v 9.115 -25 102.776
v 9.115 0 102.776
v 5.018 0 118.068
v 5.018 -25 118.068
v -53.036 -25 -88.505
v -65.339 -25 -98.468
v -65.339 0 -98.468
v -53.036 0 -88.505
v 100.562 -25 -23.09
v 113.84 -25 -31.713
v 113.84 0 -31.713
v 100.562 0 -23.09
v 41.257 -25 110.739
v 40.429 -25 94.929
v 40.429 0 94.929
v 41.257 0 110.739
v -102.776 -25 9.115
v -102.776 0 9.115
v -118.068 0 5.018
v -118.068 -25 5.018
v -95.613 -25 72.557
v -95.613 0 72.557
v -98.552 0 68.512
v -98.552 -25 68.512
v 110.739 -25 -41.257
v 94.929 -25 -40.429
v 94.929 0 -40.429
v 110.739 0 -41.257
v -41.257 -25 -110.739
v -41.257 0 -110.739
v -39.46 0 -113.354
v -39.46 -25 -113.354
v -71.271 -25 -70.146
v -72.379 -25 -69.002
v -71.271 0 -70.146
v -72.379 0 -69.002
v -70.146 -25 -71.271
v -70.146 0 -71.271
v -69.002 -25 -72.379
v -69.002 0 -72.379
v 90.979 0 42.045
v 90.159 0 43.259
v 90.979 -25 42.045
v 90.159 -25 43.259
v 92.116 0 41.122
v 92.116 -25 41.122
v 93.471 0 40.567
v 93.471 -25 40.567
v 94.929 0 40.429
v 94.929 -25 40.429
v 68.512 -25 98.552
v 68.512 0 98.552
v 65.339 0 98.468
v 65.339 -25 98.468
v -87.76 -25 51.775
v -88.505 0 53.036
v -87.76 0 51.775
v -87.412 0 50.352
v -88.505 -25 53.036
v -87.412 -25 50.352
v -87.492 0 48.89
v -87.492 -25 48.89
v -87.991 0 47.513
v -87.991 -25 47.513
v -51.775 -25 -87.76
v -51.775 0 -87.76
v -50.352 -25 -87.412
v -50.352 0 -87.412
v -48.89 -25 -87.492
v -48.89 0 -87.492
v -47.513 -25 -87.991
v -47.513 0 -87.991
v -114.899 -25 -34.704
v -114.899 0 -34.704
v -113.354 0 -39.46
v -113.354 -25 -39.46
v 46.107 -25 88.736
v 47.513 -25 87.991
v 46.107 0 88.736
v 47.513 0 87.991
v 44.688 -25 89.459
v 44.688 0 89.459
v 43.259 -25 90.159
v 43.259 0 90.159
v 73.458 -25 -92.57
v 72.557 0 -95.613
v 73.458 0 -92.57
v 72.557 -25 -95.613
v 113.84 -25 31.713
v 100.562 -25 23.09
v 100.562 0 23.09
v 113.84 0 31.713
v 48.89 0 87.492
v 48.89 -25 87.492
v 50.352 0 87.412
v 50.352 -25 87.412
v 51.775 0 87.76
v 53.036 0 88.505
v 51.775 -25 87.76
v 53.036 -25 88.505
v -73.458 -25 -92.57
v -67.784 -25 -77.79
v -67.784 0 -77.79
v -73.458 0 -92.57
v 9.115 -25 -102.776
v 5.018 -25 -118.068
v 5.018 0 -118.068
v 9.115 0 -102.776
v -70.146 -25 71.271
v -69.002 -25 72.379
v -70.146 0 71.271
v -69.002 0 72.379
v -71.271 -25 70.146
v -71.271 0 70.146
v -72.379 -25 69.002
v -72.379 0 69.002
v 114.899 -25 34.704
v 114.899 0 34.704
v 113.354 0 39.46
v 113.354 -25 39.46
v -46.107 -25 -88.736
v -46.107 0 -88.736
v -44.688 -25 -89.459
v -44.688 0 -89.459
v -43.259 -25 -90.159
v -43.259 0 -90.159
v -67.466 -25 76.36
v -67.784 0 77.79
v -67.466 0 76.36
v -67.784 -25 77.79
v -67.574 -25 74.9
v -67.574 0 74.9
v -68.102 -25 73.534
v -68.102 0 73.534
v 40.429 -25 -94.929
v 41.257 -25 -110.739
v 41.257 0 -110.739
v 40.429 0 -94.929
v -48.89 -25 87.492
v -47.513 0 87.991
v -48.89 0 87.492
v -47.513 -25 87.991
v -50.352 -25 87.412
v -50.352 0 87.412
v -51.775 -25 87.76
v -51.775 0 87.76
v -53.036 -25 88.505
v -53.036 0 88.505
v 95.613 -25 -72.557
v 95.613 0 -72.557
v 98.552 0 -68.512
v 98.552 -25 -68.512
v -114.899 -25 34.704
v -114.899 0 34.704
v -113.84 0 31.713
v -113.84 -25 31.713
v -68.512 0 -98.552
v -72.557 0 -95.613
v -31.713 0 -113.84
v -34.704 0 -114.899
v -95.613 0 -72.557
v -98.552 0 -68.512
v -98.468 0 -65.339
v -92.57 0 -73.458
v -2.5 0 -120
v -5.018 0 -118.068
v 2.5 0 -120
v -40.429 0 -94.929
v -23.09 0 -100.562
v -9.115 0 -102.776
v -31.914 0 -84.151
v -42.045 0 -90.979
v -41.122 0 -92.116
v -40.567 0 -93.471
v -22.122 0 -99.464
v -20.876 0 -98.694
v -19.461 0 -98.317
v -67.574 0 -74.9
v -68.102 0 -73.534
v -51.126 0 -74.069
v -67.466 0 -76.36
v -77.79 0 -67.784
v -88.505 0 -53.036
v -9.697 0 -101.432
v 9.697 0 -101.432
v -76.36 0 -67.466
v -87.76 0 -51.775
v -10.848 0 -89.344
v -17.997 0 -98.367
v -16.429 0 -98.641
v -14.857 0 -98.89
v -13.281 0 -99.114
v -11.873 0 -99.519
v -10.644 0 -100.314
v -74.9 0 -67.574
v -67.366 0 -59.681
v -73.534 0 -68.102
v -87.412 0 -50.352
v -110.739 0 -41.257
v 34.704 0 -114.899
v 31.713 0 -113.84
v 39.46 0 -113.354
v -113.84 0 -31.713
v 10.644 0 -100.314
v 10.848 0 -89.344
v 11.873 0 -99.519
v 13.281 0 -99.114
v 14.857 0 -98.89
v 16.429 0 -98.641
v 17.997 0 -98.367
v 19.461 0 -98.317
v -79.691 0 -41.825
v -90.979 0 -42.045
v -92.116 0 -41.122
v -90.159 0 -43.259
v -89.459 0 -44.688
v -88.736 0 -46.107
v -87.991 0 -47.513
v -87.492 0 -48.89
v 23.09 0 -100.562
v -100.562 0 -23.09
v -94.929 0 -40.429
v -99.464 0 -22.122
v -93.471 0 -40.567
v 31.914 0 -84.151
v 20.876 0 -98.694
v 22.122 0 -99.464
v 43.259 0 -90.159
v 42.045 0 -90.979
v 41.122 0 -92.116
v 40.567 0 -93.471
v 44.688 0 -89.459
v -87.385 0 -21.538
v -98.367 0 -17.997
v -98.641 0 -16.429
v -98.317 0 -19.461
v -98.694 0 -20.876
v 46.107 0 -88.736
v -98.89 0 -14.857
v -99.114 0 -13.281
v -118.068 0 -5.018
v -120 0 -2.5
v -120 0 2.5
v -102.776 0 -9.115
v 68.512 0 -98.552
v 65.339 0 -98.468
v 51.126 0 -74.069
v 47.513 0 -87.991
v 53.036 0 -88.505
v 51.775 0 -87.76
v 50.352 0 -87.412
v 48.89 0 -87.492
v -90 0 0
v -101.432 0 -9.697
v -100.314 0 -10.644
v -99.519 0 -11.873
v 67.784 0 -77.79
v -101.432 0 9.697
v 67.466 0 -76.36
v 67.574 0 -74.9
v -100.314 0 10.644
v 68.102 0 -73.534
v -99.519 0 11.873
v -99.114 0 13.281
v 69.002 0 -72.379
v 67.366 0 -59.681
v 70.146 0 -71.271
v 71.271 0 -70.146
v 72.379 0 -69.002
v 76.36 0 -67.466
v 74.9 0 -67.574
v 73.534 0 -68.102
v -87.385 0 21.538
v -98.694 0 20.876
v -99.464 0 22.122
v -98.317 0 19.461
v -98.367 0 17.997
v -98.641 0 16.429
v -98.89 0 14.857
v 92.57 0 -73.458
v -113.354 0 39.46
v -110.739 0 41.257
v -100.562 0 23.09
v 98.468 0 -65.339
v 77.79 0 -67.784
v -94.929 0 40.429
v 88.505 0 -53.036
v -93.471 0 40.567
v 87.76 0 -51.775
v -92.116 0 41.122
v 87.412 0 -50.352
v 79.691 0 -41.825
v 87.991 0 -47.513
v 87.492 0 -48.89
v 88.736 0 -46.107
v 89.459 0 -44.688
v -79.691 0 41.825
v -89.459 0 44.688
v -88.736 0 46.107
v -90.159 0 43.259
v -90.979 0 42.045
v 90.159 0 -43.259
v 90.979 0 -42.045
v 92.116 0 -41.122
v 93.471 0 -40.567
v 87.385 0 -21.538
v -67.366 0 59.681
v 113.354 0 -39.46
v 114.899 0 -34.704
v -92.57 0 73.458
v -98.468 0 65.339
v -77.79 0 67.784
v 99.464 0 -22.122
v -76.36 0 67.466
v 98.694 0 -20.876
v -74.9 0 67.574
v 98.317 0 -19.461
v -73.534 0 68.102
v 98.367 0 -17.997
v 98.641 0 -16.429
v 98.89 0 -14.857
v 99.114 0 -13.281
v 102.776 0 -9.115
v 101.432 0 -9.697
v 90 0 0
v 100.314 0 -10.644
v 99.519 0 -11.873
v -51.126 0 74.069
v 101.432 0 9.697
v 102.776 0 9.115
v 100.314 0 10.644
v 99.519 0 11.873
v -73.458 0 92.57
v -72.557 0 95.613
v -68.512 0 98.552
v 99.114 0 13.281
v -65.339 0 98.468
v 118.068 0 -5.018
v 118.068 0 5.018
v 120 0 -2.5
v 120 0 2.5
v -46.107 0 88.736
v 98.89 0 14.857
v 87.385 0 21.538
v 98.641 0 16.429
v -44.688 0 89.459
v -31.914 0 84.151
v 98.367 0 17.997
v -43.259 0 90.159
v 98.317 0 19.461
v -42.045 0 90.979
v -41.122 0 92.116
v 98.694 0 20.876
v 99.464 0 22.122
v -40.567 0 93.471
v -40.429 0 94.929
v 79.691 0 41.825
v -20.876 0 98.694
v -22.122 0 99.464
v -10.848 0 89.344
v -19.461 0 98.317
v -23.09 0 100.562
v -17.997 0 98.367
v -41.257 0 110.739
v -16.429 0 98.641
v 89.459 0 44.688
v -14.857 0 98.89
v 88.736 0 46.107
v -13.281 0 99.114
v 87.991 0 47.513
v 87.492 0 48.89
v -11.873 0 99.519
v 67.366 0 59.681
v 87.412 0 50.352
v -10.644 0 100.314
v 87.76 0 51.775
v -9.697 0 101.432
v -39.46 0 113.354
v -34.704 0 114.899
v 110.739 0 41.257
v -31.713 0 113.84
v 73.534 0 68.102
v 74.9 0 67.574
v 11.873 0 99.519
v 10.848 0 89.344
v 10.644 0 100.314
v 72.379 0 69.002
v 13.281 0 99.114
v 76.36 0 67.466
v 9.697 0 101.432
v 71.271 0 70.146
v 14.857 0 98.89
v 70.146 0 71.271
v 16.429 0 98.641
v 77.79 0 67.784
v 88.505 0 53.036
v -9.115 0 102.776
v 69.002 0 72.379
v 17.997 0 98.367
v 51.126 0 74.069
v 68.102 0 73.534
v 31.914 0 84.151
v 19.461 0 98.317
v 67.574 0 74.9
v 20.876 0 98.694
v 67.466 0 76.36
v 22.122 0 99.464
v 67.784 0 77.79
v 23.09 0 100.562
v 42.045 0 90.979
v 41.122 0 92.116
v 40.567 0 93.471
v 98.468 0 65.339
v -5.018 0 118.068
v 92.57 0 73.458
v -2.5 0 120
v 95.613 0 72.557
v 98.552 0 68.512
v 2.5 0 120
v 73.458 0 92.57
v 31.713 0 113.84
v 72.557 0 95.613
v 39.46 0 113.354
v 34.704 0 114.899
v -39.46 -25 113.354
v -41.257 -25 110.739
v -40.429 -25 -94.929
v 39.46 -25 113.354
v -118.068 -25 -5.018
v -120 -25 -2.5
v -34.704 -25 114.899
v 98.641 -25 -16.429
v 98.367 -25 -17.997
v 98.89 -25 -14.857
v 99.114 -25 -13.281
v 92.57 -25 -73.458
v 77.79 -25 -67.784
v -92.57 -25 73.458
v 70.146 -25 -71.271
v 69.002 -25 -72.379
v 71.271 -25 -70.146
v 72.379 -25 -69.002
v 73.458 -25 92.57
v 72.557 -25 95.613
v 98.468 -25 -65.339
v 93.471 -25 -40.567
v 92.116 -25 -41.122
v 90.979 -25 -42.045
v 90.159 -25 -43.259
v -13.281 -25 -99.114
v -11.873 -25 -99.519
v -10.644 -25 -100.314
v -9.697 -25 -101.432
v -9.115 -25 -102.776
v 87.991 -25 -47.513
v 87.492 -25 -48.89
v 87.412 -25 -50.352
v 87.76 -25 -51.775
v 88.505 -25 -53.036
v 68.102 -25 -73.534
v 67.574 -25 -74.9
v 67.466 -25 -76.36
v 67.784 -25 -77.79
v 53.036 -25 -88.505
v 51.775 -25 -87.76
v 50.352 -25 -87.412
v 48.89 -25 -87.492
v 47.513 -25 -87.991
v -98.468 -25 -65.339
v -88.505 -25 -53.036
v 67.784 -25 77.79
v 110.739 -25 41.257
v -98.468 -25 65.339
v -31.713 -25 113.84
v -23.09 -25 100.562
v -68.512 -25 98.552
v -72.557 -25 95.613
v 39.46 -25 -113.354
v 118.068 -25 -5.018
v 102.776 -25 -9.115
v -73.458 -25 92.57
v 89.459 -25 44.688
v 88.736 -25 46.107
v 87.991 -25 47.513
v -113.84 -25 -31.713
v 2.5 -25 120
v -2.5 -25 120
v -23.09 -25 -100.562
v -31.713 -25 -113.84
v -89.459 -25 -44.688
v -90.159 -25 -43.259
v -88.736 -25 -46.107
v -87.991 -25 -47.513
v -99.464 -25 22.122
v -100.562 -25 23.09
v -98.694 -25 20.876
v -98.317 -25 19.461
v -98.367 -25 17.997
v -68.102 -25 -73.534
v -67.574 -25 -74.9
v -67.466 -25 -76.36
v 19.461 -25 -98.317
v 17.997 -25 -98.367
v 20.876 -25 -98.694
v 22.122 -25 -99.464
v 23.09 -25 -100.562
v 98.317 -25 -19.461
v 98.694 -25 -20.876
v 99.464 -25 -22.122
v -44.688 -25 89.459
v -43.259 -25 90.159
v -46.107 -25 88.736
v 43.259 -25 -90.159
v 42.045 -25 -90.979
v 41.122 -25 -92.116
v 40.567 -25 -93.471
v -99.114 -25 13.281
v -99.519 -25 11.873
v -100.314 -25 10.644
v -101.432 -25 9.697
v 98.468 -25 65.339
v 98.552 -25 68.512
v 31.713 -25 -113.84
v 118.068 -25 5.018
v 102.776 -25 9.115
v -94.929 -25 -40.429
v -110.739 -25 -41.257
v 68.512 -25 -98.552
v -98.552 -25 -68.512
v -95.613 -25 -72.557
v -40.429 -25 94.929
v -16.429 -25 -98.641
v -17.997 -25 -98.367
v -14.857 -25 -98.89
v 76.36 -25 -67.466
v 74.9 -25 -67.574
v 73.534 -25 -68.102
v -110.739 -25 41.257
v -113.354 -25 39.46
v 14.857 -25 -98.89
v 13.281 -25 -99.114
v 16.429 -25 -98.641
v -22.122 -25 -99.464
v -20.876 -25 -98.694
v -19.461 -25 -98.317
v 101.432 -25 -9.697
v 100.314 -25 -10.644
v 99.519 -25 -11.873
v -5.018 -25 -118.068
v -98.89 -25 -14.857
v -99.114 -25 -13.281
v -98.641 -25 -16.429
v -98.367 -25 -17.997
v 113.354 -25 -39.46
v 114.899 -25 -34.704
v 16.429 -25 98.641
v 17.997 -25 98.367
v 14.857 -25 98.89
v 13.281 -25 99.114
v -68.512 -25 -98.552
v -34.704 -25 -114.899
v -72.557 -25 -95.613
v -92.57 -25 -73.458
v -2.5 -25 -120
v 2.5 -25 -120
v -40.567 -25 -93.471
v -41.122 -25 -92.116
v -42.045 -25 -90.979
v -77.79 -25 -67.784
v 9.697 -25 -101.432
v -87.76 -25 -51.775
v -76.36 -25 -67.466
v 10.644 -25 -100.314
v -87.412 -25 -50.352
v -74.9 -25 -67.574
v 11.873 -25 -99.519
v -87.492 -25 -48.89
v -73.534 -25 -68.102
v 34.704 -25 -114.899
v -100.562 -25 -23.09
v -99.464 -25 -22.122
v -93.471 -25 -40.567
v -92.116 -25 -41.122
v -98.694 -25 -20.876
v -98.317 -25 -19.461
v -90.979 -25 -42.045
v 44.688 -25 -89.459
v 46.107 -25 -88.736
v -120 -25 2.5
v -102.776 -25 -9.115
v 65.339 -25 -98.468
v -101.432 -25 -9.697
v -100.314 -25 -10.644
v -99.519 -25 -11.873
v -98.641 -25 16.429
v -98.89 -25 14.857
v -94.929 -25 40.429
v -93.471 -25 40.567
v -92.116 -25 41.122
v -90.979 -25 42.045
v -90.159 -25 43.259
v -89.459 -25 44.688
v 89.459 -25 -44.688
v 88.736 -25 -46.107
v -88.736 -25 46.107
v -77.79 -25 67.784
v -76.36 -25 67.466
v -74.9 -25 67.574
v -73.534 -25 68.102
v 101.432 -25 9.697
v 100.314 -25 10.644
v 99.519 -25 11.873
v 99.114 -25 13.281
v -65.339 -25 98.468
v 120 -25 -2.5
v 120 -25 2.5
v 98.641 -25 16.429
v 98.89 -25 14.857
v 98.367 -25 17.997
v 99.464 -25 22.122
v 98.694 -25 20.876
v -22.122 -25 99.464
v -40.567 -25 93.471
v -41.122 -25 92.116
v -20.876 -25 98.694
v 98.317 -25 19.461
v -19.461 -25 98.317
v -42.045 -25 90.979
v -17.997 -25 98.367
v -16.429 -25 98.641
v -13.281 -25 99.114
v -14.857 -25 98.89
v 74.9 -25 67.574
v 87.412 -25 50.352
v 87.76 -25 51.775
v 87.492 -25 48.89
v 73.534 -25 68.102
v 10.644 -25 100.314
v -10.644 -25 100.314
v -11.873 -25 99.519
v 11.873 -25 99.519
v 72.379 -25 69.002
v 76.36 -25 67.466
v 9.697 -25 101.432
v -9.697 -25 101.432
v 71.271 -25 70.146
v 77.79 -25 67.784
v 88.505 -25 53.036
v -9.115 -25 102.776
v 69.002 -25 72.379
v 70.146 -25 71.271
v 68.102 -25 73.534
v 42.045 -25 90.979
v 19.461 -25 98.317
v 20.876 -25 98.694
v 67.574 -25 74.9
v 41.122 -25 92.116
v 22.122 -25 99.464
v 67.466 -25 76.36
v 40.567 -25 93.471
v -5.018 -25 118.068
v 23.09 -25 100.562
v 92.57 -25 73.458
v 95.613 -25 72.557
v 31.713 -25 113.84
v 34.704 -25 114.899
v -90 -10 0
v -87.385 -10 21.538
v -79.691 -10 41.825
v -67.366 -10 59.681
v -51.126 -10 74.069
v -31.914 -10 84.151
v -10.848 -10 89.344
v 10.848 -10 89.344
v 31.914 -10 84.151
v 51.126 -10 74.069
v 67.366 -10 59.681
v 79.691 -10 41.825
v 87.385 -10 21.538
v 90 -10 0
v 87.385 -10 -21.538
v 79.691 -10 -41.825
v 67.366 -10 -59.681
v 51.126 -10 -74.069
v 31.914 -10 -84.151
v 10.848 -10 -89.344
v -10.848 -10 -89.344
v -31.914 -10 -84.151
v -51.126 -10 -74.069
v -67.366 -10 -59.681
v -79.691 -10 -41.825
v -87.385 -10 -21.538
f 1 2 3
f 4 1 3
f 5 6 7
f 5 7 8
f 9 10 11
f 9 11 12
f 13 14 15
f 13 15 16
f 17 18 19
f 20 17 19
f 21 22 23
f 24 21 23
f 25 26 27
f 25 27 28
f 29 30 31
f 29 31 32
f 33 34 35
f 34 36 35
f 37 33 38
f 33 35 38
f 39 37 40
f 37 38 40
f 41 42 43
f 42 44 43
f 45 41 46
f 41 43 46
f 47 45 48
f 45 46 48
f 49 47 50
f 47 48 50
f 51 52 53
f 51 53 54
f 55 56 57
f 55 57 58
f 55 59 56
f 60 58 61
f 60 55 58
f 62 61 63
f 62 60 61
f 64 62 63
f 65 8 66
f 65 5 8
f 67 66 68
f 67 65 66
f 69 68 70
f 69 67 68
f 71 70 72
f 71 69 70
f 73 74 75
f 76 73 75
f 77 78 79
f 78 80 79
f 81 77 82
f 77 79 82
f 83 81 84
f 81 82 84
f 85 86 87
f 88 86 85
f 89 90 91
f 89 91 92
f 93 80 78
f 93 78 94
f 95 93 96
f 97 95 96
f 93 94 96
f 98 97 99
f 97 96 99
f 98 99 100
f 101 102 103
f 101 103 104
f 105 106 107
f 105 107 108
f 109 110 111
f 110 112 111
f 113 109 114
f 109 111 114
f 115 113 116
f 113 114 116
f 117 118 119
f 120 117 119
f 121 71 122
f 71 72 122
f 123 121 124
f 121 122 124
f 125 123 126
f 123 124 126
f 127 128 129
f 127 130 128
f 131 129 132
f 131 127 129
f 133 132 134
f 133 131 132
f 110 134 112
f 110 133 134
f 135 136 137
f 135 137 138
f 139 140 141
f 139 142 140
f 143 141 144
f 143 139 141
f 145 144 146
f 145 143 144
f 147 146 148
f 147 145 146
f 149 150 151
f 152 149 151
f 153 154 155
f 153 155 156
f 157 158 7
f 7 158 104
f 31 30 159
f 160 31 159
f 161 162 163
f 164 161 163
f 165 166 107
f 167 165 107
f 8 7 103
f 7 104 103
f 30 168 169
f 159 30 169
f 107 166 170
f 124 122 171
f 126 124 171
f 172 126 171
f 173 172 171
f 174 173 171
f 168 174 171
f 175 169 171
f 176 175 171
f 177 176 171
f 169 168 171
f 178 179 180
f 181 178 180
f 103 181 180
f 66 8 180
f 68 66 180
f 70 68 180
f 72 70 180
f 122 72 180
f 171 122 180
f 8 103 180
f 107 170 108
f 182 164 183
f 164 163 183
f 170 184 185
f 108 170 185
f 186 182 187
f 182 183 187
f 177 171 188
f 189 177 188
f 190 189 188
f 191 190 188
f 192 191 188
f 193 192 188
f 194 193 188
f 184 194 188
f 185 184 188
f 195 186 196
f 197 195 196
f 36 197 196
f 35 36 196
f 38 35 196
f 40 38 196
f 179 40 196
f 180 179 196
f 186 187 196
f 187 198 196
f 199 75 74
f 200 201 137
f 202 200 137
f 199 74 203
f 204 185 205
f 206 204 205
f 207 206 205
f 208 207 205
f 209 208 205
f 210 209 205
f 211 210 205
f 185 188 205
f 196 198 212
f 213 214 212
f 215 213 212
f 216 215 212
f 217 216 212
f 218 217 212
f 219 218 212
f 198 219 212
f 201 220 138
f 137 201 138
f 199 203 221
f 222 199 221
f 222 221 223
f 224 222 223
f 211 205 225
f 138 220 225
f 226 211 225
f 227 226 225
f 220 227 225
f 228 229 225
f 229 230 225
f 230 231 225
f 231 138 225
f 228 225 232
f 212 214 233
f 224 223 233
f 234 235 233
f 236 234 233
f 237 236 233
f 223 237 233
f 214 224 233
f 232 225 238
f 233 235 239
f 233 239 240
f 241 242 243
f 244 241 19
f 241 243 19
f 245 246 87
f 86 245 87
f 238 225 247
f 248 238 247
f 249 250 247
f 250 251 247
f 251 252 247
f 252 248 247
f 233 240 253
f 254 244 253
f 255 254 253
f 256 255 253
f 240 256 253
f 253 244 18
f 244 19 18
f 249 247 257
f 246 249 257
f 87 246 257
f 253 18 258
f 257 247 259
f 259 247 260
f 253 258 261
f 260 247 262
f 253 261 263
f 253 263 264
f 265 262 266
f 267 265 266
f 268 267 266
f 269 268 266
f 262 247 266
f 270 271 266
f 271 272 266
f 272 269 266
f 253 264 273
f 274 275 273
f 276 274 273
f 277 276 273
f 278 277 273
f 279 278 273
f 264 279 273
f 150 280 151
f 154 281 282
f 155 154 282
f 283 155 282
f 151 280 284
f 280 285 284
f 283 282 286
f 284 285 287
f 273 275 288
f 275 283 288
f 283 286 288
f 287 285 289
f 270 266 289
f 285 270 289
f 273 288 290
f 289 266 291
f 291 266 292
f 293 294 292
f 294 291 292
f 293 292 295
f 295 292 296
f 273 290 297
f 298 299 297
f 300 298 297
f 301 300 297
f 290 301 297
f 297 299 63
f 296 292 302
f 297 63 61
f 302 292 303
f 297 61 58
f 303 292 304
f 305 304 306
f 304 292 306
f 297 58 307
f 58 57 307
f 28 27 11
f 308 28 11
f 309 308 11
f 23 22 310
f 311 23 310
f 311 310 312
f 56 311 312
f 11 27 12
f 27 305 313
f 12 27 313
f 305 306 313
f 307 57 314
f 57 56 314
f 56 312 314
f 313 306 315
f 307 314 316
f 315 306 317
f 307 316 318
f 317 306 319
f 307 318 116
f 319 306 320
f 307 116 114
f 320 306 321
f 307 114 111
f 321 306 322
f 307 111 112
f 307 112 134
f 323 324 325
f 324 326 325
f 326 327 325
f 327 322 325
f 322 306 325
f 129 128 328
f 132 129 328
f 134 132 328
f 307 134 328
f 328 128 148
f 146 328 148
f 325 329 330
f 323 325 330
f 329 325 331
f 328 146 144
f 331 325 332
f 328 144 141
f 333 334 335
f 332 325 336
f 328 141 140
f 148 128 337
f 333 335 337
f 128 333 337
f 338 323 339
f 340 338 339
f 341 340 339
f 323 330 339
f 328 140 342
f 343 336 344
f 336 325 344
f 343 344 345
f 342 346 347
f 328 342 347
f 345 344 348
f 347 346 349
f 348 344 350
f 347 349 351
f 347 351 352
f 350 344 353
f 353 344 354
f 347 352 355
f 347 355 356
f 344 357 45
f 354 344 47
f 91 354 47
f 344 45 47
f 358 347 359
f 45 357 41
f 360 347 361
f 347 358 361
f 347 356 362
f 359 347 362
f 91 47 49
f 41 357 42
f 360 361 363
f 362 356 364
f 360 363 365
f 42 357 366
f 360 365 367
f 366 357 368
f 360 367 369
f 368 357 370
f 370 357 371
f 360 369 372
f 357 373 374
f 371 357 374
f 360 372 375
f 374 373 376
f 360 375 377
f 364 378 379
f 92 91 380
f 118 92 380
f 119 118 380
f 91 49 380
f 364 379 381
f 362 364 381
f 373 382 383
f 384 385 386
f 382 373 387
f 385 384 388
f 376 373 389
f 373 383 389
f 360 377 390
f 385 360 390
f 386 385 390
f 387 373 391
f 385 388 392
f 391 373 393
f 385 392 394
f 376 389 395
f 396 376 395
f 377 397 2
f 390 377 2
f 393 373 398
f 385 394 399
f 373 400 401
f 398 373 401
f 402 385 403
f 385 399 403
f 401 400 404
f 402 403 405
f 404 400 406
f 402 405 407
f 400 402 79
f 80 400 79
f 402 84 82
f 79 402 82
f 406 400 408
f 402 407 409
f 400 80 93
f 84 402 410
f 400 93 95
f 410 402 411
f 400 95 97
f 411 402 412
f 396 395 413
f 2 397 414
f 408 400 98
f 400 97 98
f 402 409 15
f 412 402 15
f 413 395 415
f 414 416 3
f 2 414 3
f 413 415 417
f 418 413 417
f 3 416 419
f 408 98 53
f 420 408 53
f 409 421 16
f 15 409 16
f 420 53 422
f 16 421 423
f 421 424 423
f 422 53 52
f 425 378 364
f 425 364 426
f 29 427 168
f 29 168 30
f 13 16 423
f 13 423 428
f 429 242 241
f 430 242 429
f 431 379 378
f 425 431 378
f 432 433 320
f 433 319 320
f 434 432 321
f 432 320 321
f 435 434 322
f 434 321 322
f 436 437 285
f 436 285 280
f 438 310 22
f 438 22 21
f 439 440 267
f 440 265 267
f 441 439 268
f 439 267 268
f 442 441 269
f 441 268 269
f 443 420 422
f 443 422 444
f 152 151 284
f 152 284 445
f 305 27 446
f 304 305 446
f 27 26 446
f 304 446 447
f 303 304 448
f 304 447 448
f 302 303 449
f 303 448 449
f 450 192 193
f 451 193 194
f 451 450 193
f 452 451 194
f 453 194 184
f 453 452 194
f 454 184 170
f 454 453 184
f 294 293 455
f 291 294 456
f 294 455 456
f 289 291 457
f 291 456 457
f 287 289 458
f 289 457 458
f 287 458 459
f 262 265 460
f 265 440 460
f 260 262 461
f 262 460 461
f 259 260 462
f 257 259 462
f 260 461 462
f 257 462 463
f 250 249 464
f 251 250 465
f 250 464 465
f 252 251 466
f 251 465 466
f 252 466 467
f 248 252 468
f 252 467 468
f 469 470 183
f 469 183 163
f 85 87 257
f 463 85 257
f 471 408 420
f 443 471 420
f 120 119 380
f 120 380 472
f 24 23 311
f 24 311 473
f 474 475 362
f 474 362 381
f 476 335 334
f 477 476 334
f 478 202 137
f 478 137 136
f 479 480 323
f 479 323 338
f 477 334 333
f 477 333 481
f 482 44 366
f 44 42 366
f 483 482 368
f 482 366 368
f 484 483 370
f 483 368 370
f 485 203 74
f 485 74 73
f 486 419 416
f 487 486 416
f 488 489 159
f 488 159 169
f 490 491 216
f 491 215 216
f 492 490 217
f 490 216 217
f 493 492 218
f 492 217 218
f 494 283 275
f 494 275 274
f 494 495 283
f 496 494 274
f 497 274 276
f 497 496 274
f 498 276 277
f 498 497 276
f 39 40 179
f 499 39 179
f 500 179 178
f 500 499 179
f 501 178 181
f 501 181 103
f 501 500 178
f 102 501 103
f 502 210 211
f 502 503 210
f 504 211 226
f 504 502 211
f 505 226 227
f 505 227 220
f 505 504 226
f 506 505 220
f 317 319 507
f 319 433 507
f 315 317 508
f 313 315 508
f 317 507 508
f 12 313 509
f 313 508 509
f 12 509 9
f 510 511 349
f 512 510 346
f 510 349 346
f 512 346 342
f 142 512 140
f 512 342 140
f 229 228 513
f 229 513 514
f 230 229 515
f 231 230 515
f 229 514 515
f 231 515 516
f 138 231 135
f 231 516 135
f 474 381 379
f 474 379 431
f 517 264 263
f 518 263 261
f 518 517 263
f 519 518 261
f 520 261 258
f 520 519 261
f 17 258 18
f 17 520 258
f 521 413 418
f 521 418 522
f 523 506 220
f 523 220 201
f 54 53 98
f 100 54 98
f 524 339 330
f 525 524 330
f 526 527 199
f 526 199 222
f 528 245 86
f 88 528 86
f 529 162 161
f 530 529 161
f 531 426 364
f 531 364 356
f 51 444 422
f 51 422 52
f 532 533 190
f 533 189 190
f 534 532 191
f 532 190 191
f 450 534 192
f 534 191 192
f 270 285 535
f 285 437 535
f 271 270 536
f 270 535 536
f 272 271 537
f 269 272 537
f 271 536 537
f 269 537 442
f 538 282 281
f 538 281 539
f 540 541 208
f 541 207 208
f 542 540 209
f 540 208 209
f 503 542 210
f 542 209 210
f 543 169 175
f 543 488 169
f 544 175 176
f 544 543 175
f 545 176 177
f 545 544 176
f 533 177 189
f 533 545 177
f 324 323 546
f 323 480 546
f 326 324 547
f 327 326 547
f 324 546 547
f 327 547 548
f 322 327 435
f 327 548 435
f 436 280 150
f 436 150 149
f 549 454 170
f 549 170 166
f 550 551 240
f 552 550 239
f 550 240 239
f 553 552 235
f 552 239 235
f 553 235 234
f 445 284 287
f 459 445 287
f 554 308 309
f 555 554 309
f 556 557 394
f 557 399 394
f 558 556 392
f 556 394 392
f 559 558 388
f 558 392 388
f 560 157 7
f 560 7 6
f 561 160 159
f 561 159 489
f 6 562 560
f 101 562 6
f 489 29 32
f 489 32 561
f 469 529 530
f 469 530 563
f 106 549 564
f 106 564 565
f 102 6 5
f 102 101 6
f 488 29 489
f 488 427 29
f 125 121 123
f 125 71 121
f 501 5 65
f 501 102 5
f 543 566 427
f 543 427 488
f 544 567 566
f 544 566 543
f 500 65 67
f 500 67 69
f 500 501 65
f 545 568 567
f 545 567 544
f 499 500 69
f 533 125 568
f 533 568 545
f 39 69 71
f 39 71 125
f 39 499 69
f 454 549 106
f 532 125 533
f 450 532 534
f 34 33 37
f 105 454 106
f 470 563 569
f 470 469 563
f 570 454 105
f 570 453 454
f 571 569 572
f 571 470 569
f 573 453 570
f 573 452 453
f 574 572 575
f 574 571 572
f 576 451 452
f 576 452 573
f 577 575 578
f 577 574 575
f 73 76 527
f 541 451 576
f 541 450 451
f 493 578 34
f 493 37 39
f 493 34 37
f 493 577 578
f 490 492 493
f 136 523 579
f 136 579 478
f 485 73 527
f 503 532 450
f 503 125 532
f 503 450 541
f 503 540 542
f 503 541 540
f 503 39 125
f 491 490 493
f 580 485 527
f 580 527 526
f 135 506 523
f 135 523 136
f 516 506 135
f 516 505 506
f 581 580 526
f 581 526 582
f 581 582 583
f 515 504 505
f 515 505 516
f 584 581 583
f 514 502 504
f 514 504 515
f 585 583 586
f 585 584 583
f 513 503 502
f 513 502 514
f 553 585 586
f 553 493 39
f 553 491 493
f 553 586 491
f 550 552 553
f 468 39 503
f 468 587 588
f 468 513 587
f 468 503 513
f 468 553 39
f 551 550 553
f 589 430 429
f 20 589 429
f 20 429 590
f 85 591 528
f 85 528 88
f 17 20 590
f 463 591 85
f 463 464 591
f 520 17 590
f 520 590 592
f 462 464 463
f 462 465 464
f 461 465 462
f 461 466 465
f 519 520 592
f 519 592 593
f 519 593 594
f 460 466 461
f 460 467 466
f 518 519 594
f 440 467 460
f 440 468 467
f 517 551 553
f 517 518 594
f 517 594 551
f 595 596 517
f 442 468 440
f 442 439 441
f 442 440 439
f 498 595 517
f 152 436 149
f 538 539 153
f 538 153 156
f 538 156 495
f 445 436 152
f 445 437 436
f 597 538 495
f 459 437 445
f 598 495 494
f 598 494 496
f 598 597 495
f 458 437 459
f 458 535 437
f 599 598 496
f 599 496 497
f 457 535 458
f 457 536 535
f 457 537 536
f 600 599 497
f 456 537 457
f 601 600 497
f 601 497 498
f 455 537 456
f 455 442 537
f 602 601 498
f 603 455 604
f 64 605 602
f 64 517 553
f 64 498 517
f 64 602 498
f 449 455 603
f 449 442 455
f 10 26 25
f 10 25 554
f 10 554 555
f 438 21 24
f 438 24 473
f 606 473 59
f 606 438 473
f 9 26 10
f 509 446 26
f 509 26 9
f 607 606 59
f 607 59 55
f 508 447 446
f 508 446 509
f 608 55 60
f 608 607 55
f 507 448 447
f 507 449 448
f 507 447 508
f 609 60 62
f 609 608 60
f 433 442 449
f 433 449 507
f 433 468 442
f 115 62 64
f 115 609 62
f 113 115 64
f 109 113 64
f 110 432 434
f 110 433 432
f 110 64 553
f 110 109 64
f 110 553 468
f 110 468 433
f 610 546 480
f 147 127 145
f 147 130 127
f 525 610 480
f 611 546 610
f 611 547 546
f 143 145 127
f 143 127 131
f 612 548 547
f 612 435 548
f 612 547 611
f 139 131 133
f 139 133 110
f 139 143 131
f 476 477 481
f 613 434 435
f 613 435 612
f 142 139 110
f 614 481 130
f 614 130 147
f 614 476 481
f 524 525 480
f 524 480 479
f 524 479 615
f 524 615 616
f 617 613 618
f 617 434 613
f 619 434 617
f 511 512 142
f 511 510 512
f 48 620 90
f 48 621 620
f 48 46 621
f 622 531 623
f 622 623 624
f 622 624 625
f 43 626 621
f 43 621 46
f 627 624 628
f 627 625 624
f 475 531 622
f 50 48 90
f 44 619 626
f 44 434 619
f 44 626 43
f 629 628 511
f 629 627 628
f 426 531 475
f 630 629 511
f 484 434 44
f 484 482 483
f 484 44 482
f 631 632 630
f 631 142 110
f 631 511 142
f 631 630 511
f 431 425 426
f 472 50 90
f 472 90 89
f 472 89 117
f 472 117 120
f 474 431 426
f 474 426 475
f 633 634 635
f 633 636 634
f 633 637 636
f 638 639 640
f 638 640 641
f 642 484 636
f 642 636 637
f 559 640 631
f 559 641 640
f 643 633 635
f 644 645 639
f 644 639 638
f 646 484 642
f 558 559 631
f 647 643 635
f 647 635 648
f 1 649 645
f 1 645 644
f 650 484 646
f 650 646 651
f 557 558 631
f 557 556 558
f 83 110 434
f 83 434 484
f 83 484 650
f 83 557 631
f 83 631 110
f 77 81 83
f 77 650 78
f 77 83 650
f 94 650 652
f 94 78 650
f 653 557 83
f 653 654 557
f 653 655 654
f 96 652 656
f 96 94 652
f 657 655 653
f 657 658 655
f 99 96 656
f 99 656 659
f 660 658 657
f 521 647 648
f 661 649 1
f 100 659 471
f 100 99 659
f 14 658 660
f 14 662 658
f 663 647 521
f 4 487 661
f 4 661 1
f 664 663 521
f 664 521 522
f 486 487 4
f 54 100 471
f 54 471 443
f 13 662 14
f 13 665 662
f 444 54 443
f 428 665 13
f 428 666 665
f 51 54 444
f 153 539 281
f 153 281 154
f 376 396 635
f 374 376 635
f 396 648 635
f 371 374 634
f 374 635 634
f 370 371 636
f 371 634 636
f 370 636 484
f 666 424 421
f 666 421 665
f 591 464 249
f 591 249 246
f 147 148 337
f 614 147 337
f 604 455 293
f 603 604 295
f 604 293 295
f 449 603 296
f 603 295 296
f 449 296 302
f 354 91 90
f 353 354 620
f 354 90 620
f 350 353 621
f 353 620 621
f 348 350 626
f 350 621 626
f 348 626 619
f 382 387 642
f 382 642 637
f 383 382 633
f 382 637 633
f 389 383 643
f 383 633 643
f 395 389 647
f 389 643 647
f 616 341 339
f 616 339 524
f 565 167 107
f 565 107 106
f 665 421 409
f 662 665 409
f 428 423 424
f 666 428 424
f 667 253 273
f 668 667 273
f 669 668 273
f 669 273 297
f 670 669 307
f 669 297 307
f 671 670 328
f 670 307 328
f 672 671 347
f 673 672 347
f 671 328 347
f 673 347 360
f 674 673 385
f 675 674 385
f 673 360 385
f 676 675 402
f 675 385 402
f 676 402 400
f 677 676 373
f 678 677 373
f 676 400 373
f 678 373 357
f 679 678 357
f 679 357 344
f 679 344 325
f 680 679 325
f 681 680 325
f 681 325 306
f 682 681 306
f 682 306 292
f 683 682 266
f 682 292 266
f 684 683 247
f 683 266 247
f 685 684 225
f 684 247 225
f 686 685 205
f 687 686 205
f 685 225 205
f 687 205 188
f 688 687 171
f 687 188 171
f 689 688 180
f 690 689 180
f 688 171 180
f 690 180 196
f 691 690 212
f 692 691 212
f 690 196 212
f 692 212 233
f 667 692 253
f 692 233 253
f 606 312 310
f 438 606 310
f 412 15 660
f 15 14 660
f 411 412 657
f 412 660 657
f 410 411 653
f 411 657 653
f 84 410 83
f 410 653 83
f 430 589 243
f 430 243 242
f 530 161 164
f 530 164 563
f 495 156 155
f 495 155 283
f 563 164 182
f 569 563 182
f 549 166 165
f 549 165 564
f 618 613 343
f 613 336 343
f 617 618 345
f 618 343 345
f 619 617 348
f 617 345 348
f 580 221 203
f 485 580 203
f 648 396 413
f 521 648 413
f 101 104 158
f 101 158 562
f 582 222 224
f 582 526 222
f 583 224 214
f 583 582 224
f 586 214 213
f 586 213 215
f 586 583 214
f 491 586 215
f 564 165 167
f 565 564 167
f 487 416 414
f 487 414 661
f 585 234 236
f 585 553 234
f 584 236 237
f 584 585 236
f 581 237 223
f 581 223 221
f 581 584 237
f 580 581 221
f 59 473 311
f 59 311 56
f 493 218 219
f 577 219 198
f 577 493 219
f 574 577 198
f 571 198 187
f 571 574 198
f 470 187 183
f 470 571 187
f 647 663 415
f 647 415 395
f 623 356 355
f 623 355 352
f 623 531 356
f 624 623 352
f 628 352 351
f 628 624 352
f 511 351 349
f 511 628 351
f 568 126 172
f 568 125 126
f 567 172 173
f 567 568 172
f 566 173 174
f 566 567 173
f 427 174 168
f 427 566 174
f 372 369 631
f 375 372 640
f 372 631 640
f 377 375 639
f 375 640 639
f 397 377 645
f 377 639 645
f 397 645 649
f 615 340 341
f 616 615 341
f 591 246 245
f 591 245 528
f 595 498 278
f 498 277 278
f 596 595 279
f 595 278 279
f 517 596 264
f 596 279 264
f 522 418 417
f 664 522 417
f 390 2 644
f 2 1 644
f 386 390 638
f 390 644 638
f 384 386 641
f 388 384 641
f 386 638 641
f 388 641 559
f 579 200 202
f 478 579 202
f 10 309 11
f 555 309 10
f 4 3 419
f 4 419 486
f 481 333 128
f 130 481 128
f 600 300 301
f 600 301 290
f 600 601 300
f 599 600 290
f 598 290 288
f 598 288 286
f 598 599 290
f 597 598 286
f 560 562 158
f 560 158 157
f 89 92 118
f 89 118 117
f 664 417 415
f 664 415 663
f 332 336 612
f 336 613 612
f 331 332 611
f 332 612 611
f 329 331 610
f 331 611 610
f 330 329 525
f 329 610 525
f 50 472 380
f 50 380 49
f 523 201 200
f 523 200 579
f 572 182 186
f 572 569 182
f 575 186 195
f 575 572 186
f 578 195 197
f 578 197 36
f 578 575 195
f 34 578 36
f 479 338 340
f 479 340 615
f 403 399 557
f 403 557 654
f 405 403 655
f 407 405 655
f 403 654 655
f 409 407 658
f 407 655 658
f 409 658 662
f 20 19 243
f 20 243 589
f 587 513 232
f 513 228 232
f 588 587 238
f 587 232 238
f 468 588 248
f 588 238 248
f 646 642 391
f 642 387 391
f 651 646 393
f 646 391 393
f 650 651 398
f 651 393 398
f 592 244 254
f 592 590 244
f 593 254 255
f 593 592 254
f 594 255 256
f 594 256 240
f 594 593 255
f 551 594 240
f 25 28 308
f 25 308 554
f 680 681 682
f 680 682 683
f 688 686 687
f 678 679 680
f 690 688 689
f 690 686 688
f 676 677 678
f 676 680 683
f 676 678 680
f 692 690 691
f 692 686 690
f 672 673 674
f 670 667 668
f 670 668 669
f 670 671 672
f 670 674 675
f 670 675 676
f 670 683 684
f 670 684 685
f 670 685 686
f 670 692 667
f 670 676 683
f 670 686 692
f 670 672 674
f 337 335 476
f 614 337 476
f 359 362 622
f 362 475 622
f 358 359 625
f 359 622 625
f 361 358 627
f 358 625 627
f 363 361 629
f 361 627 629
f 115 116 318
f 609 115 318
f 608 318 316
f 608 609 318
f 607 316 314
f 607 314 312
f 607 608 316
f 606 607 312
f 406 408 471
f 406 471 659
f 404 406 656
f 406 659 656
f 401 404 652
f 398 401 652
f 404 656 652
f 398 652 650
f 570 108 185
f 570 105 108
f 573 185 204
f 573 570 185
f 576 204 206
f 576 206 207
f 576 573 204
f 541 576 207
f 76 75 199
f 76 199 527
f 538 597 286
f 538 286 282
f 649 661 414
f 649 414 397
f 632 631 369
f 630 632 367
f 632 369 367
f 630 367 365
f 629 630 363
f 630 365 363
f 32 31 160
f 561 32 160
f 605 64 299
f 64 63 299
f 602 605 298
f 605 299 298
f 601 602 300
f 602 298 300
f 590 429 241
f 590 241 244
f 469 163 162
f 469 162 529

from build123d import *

# Parameters (mm, degrees)
F0_R            = 100
F1_DEPTH        = 25
F3_DEPTH        = 25
F3_COPIES_COUNT = 20
F4_SIZE         = 2
F5_R            = 5
F6_R            = 90
F7_DEPTH        = 10


# Not quite as in the source:
# - a pattern or mirror of a feature is missing from the dataset's text; its kind, count and spacing are read off the source's solid


with BuildPart() as f1:
    # F0 (on Front) → F1 (new body)
    with BuildSketch(Plane.XZ):
        Circle(F0_R)
    extrude(amount=F1_DEPTH)

    # F2 (on Front) → F3 (join)
    with BuildSketch(Plane.XZ):
        Polygon((-4.5, 120), (-9.9931095726, 99.4994359837), (9.9931095726, 99.4994359837), (4.5, 120), align=None)
    f3 = extrude(amount=F3_DEPTH)

    # F3_copies: F3 ×20 about axis
    f3_copies_axis = Axis((0, 0, 0), (0, 1, 0))
    for i in range(1, F3_COPIES_COUNT):
        add(f3.rotate(f3_copies_axis, i * 360 / F3_COPIES_COUNT))

    # F4
    f4_edges = [f1.edges().sort_by_distance(p)[0] for p in [
        (-4.5, -12.5, 120),
        (4.5, -12.5, 120),
        (-32.802285, -12.5, 115.517358),
        (115.517358, -12.5, 32.802285),
        (120, -12.5, 4.5),
        (120, -12.5, -4.5),
        (115.517358, -12.5, -32.802285),
        (112.736205, -12.5, -41.361794),
        (99.727073, -12.5, -66.893654),
        (94.437006, -12.5, -74.174807),
        (74.174807, -12.5, -94.437006),
        (66.893654, -12.5, -99.727073),
        (41.361794, -12.5, -112.736205),
        (32.802285, -12.5, -115.517358),
        (4.5, -12.5, -120),
        (-4.5, -12.5, -120),
        (-32.802285, -12.5, -115.517358),
        (-41.361794, -12.5, -112.736205),
        (-66.893654, -12.5, -99.727073),
        (-74.174807, -12.5, -94.437006),
        (-94.437006, -12.5, -74.174807),
        (-99.727073, -12.5, -66.893654),
        (-112.736205, -12.5, -41.361794),
        (-115.517358, -12.5, -32.802285),
        (-120, -12.5, -4.5),
        (-120, -12.5, 4.5),
        (-115.517358, -12.5, 32.802285),
        (-112.736205, -12.5, 41.361794),
        (-99.727073, -12.5, 66.893654),
        (-94.437006, -12.5, 74.174807),
        (-74.174807, -12.5, 94.437006),
        (-66.893654, -12.5, 99.727073),
        (32.802285, -12.5, 115.517358),
        (41.361794, -12.5, 112.736205),
        (66.893654, -12.5, 99.727073),
        (74.174807, -12.5, 94.437006),
        (94.437006, -12.5, 74.174807),
        (99.727073, -12.5, 66.893654),
        (112.736205, -12.5, 41.361794),
        (-41.361794, -12.5, 112.736205),
    ]]
    chamfer(f4_edges, length=F4_SIZE)

    # F5
    f5_edges = [f1.edges().sort_by_distance(p)[0] for p in [
        (-9.99311, -12.5, 99.499436),
        (9.99311, -12.5, 99.499436),
        (97.717628, -12.5, 21.243005),
        (99.499436, -12.5, 9.99311),
        (91.541546, -12.5, 40.251029),
        (86.370537, -12.5, 50.399706),
        (99.499436, -12.5, -9.99311),
        (97.717628, -12.5, -21.243005),
        (74.622932, -12.5, 66.568897),
        (66.568897, -12.5, 74.622932),
        (91.541546, -12.5, -40.251029),
        (86.370537, -12.5, -50.399706),
        (50.399706, -12.5, 86.370537),
        (40.251029, -12.5, 91.541546),
        (74.622932, -12.5, -66.568897),
        (66.568897, -12.5, -74.622932),
        (21.243005, -12.5, 97.717628),
        (50.399706, -12.5, -86.370537),
        (40.251029, -12.5, -91.541546),
        (-21.243005, -12.5, 97.717628),
        (21.243005, -12.5, -97.717628),
        (9.99311, -12.5, -99.499436),
        (-40.251029, -12.5, 91.541546),
        (-50.399706, -12.5, 86.370537),
        (-9.99311, -12.5, -99.499436),
        (-21.243005, -12.5, -97.717628),
        (-66.568897, -12.5, 74.622932),
        (-74.622932, -12.5, 66.568897),
        (-40.251029, -12.5, -91.541546),
        (-50.399706, -12.5, -86.370537),
        (-86.370537, -12.5, 50.399706),
        (-91.541546, -12.5, 40.251029),
        (-66.568897, -12.5, -74.622932),
        (-74.622932, -12.5, -66.568897),
        (-97.717628, -12.5, 21.243005),
        (-99.499436, -12.5, 9.99311),
        (-86.370537, -12.5, -50.399706),
        (-91.541546, -12.5, -40.251029),
        (-99.499436, -12.5, -9.99311),
        (-97.717628, -12.5, -21.243005),
    ]]
    fillet(f5_edges, radius=F5_R)

    # F6 (on face) → F7 (cut)
    with BuildSketch(Plane(origin=(0, 0, 0), x_dir=(-1, 0, 0), z_dir=(0, 1, 0))):
        Circle(F6_R)
    extrude(amount=-F7_DEPTH, mode=Mode.SUBTRACT)


solid = f1.part
